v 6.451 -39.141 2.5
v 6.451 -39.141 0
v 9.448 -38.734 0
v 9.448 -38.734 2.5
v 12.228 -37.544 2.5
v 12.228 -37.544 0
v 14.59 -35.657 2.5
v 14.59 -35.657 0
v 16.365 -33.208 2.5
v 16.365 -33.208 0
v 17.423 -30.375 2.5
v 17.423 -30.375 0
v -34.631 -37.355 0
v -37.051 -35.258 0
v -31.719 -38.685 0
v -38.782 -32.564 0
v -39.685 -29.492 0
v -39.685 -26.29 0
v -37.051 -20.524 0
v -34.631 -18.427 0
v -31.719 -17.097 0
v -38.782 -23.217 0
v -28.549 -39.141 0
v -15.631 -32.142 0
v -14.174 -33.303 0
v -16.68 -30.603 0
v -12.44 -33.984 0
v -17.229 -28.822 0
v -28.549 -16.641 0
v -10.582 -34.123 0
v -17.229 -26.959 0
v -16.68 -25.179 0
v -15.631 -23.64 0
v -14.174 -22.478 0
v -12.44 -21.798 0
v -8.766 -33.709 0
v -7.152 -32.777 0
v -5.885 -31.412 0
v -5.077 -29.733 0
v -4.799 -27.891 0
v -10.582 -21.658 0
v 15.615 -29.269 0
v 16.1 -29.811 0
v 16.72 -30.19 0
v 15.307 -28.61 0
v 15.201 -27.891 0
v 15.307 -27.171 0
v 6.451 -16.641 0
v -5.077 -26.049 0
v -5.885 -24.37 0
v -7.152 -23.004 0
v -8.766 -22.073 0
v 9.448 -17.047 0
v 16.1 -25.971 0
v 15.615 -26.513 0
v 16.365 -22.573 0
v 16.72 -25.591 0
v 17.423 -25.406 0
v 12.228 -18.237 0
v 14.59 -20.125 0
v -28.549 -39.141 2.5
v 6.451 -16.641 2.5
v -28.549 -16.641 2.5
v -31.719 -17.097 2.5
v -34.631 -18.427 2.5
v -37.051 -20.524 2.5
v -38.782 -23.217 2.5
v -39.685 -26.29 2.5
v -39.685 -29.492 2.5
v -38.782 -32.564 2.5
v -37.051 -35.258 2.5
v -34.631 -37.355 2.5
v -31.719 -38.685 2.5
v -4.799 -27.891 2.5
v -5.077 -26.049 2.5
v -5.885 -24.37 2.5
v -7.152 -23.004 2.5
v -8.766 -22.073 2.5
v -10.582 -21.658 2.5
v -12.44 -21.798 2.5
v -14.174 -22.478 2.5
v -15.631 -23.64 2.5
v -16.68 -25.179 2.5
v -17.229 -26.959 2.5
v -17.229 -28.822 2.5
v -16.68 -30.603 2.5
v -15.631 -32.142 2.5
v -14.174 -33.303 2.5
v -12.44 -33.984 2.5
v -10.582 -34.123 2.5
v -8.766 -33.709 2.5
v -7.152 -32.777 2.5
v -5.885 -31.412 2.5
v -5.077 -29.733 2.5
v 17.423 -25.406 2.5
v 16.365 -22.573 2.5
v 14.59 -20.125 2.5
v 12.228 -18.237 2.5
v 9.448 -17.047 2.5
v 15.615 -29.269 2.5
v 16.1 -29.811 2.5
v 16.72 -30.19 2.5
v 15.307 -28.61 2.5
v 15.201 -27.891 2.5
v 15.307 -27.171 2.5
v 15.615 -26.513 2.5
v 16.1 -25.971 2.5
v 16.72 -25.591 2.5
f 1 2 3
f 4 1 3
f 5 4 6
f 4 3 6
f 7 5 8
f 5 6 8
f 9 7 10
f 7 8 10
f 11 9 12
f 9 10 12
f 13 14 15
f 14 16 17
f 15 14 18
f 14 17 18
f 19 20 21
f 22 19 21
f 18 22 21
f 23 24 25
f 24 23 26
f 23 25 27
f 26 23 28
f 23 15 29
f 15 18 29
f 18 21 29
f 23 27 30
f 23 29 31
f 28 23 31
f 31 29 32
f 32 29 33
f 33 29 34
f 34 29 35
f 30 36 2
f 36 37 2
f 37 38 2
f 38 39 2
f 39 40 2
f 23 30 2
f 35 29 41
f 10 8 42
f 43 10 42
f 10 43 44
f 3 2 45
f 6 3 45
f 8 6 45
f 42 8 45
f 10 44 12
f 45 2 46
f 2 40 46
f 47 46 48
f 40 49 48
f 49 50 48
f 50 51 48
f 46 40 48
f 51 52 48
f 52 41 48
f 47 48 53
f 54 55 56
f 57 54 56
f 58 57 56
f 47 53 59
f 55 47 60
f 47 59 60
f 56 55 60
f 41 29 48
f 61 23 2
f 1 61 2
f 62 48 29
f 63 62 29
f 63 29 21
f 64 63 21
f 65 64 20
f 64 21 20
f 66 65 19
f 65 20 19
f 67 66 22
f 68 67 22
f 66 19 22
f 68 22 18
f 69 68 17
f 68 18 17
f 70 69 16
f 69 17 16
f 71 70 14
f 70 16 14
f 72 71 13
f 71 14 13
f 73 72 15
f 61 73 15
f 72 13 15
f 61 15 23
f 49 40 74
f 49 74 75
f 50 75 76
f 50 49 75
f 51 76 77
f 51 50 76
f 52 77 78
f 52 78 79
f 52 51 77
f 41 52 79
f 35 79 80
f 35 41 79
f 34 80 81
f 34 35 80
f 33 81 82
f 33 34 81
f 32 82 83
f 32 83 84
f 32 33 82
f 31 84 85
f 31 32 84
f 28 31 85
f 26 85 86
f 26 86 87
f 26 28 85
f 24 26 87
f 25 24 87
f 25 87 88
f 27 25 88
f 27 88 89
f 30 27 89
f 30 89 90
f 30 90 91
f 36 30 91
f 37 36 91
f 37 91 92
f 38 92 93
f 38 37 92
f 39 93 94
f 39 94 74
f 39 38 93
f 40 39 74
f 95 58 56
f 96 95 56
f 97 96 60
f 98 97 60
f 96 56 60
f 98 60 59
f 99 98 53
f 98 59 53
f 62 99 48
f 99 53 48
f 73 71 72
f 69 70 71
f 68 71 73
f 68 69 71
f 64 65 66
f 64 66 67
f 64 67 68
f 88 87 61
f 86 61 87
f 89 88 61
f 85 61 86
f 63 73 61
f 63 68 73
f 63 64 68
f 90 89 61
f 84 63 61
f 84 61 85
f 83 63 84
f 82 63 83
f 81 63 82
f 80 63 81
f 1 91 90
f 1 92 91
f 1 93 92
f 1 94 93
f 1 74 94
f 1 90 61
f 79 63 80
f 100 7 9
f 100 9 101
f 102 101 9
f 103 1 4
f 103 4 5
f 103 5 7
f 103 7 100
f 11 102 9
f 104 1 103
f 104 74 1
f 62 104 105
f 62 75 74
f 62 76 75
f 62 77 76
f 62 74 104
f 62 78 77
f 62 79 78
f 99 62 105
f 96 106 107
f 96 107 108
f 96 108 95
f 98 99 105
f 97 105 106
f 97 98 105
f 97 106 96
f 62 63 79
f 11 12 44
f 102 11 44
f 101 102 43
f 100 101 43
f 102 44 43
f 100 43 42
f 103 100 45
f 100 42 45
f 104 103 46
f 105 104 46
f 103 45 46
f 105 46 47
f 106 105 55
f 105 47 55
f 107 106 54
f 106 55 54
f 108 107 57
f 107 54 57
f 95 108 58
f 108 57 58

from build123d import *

# Parameters (mm, degrees)
F0_R     = 6.25
F1_DEPTH = 2.5


with BuildPart() as f1:
    # F0 (on Top) → F1 (new body)
    with BuildSketch(Plane.XY):
        with BuildLine():
            ThreePointArc((-28.549118, -16.640839), (-39.799118, -27.890839), (-28.549118, -39.140839))
            Line((-28.549118, -39.140839), (6.450882, -39.140839))
            ThreePointArc((6.450882, -39.140839), (13.472693, -36.680417), (17.423104, -30.375359))
            ThreePointArc((17.423104, -30.375359), (15.200882, -27.890839), (17.423104, -25.406319))
            ThreePointArc((17.423104, -25.406319), (13.472693, -19.101262), (6.450882, -16.640839))
            Line((6.450882, -16.640839), (-28.549118, -16.640839))
        make_face()
        with Locations((-11.049118, -27.890839)):
            Circle(F0_R, mode=Mode.SUBTRACT)
    extrude(amount=F1_DEPTH)


solid = f1.part
